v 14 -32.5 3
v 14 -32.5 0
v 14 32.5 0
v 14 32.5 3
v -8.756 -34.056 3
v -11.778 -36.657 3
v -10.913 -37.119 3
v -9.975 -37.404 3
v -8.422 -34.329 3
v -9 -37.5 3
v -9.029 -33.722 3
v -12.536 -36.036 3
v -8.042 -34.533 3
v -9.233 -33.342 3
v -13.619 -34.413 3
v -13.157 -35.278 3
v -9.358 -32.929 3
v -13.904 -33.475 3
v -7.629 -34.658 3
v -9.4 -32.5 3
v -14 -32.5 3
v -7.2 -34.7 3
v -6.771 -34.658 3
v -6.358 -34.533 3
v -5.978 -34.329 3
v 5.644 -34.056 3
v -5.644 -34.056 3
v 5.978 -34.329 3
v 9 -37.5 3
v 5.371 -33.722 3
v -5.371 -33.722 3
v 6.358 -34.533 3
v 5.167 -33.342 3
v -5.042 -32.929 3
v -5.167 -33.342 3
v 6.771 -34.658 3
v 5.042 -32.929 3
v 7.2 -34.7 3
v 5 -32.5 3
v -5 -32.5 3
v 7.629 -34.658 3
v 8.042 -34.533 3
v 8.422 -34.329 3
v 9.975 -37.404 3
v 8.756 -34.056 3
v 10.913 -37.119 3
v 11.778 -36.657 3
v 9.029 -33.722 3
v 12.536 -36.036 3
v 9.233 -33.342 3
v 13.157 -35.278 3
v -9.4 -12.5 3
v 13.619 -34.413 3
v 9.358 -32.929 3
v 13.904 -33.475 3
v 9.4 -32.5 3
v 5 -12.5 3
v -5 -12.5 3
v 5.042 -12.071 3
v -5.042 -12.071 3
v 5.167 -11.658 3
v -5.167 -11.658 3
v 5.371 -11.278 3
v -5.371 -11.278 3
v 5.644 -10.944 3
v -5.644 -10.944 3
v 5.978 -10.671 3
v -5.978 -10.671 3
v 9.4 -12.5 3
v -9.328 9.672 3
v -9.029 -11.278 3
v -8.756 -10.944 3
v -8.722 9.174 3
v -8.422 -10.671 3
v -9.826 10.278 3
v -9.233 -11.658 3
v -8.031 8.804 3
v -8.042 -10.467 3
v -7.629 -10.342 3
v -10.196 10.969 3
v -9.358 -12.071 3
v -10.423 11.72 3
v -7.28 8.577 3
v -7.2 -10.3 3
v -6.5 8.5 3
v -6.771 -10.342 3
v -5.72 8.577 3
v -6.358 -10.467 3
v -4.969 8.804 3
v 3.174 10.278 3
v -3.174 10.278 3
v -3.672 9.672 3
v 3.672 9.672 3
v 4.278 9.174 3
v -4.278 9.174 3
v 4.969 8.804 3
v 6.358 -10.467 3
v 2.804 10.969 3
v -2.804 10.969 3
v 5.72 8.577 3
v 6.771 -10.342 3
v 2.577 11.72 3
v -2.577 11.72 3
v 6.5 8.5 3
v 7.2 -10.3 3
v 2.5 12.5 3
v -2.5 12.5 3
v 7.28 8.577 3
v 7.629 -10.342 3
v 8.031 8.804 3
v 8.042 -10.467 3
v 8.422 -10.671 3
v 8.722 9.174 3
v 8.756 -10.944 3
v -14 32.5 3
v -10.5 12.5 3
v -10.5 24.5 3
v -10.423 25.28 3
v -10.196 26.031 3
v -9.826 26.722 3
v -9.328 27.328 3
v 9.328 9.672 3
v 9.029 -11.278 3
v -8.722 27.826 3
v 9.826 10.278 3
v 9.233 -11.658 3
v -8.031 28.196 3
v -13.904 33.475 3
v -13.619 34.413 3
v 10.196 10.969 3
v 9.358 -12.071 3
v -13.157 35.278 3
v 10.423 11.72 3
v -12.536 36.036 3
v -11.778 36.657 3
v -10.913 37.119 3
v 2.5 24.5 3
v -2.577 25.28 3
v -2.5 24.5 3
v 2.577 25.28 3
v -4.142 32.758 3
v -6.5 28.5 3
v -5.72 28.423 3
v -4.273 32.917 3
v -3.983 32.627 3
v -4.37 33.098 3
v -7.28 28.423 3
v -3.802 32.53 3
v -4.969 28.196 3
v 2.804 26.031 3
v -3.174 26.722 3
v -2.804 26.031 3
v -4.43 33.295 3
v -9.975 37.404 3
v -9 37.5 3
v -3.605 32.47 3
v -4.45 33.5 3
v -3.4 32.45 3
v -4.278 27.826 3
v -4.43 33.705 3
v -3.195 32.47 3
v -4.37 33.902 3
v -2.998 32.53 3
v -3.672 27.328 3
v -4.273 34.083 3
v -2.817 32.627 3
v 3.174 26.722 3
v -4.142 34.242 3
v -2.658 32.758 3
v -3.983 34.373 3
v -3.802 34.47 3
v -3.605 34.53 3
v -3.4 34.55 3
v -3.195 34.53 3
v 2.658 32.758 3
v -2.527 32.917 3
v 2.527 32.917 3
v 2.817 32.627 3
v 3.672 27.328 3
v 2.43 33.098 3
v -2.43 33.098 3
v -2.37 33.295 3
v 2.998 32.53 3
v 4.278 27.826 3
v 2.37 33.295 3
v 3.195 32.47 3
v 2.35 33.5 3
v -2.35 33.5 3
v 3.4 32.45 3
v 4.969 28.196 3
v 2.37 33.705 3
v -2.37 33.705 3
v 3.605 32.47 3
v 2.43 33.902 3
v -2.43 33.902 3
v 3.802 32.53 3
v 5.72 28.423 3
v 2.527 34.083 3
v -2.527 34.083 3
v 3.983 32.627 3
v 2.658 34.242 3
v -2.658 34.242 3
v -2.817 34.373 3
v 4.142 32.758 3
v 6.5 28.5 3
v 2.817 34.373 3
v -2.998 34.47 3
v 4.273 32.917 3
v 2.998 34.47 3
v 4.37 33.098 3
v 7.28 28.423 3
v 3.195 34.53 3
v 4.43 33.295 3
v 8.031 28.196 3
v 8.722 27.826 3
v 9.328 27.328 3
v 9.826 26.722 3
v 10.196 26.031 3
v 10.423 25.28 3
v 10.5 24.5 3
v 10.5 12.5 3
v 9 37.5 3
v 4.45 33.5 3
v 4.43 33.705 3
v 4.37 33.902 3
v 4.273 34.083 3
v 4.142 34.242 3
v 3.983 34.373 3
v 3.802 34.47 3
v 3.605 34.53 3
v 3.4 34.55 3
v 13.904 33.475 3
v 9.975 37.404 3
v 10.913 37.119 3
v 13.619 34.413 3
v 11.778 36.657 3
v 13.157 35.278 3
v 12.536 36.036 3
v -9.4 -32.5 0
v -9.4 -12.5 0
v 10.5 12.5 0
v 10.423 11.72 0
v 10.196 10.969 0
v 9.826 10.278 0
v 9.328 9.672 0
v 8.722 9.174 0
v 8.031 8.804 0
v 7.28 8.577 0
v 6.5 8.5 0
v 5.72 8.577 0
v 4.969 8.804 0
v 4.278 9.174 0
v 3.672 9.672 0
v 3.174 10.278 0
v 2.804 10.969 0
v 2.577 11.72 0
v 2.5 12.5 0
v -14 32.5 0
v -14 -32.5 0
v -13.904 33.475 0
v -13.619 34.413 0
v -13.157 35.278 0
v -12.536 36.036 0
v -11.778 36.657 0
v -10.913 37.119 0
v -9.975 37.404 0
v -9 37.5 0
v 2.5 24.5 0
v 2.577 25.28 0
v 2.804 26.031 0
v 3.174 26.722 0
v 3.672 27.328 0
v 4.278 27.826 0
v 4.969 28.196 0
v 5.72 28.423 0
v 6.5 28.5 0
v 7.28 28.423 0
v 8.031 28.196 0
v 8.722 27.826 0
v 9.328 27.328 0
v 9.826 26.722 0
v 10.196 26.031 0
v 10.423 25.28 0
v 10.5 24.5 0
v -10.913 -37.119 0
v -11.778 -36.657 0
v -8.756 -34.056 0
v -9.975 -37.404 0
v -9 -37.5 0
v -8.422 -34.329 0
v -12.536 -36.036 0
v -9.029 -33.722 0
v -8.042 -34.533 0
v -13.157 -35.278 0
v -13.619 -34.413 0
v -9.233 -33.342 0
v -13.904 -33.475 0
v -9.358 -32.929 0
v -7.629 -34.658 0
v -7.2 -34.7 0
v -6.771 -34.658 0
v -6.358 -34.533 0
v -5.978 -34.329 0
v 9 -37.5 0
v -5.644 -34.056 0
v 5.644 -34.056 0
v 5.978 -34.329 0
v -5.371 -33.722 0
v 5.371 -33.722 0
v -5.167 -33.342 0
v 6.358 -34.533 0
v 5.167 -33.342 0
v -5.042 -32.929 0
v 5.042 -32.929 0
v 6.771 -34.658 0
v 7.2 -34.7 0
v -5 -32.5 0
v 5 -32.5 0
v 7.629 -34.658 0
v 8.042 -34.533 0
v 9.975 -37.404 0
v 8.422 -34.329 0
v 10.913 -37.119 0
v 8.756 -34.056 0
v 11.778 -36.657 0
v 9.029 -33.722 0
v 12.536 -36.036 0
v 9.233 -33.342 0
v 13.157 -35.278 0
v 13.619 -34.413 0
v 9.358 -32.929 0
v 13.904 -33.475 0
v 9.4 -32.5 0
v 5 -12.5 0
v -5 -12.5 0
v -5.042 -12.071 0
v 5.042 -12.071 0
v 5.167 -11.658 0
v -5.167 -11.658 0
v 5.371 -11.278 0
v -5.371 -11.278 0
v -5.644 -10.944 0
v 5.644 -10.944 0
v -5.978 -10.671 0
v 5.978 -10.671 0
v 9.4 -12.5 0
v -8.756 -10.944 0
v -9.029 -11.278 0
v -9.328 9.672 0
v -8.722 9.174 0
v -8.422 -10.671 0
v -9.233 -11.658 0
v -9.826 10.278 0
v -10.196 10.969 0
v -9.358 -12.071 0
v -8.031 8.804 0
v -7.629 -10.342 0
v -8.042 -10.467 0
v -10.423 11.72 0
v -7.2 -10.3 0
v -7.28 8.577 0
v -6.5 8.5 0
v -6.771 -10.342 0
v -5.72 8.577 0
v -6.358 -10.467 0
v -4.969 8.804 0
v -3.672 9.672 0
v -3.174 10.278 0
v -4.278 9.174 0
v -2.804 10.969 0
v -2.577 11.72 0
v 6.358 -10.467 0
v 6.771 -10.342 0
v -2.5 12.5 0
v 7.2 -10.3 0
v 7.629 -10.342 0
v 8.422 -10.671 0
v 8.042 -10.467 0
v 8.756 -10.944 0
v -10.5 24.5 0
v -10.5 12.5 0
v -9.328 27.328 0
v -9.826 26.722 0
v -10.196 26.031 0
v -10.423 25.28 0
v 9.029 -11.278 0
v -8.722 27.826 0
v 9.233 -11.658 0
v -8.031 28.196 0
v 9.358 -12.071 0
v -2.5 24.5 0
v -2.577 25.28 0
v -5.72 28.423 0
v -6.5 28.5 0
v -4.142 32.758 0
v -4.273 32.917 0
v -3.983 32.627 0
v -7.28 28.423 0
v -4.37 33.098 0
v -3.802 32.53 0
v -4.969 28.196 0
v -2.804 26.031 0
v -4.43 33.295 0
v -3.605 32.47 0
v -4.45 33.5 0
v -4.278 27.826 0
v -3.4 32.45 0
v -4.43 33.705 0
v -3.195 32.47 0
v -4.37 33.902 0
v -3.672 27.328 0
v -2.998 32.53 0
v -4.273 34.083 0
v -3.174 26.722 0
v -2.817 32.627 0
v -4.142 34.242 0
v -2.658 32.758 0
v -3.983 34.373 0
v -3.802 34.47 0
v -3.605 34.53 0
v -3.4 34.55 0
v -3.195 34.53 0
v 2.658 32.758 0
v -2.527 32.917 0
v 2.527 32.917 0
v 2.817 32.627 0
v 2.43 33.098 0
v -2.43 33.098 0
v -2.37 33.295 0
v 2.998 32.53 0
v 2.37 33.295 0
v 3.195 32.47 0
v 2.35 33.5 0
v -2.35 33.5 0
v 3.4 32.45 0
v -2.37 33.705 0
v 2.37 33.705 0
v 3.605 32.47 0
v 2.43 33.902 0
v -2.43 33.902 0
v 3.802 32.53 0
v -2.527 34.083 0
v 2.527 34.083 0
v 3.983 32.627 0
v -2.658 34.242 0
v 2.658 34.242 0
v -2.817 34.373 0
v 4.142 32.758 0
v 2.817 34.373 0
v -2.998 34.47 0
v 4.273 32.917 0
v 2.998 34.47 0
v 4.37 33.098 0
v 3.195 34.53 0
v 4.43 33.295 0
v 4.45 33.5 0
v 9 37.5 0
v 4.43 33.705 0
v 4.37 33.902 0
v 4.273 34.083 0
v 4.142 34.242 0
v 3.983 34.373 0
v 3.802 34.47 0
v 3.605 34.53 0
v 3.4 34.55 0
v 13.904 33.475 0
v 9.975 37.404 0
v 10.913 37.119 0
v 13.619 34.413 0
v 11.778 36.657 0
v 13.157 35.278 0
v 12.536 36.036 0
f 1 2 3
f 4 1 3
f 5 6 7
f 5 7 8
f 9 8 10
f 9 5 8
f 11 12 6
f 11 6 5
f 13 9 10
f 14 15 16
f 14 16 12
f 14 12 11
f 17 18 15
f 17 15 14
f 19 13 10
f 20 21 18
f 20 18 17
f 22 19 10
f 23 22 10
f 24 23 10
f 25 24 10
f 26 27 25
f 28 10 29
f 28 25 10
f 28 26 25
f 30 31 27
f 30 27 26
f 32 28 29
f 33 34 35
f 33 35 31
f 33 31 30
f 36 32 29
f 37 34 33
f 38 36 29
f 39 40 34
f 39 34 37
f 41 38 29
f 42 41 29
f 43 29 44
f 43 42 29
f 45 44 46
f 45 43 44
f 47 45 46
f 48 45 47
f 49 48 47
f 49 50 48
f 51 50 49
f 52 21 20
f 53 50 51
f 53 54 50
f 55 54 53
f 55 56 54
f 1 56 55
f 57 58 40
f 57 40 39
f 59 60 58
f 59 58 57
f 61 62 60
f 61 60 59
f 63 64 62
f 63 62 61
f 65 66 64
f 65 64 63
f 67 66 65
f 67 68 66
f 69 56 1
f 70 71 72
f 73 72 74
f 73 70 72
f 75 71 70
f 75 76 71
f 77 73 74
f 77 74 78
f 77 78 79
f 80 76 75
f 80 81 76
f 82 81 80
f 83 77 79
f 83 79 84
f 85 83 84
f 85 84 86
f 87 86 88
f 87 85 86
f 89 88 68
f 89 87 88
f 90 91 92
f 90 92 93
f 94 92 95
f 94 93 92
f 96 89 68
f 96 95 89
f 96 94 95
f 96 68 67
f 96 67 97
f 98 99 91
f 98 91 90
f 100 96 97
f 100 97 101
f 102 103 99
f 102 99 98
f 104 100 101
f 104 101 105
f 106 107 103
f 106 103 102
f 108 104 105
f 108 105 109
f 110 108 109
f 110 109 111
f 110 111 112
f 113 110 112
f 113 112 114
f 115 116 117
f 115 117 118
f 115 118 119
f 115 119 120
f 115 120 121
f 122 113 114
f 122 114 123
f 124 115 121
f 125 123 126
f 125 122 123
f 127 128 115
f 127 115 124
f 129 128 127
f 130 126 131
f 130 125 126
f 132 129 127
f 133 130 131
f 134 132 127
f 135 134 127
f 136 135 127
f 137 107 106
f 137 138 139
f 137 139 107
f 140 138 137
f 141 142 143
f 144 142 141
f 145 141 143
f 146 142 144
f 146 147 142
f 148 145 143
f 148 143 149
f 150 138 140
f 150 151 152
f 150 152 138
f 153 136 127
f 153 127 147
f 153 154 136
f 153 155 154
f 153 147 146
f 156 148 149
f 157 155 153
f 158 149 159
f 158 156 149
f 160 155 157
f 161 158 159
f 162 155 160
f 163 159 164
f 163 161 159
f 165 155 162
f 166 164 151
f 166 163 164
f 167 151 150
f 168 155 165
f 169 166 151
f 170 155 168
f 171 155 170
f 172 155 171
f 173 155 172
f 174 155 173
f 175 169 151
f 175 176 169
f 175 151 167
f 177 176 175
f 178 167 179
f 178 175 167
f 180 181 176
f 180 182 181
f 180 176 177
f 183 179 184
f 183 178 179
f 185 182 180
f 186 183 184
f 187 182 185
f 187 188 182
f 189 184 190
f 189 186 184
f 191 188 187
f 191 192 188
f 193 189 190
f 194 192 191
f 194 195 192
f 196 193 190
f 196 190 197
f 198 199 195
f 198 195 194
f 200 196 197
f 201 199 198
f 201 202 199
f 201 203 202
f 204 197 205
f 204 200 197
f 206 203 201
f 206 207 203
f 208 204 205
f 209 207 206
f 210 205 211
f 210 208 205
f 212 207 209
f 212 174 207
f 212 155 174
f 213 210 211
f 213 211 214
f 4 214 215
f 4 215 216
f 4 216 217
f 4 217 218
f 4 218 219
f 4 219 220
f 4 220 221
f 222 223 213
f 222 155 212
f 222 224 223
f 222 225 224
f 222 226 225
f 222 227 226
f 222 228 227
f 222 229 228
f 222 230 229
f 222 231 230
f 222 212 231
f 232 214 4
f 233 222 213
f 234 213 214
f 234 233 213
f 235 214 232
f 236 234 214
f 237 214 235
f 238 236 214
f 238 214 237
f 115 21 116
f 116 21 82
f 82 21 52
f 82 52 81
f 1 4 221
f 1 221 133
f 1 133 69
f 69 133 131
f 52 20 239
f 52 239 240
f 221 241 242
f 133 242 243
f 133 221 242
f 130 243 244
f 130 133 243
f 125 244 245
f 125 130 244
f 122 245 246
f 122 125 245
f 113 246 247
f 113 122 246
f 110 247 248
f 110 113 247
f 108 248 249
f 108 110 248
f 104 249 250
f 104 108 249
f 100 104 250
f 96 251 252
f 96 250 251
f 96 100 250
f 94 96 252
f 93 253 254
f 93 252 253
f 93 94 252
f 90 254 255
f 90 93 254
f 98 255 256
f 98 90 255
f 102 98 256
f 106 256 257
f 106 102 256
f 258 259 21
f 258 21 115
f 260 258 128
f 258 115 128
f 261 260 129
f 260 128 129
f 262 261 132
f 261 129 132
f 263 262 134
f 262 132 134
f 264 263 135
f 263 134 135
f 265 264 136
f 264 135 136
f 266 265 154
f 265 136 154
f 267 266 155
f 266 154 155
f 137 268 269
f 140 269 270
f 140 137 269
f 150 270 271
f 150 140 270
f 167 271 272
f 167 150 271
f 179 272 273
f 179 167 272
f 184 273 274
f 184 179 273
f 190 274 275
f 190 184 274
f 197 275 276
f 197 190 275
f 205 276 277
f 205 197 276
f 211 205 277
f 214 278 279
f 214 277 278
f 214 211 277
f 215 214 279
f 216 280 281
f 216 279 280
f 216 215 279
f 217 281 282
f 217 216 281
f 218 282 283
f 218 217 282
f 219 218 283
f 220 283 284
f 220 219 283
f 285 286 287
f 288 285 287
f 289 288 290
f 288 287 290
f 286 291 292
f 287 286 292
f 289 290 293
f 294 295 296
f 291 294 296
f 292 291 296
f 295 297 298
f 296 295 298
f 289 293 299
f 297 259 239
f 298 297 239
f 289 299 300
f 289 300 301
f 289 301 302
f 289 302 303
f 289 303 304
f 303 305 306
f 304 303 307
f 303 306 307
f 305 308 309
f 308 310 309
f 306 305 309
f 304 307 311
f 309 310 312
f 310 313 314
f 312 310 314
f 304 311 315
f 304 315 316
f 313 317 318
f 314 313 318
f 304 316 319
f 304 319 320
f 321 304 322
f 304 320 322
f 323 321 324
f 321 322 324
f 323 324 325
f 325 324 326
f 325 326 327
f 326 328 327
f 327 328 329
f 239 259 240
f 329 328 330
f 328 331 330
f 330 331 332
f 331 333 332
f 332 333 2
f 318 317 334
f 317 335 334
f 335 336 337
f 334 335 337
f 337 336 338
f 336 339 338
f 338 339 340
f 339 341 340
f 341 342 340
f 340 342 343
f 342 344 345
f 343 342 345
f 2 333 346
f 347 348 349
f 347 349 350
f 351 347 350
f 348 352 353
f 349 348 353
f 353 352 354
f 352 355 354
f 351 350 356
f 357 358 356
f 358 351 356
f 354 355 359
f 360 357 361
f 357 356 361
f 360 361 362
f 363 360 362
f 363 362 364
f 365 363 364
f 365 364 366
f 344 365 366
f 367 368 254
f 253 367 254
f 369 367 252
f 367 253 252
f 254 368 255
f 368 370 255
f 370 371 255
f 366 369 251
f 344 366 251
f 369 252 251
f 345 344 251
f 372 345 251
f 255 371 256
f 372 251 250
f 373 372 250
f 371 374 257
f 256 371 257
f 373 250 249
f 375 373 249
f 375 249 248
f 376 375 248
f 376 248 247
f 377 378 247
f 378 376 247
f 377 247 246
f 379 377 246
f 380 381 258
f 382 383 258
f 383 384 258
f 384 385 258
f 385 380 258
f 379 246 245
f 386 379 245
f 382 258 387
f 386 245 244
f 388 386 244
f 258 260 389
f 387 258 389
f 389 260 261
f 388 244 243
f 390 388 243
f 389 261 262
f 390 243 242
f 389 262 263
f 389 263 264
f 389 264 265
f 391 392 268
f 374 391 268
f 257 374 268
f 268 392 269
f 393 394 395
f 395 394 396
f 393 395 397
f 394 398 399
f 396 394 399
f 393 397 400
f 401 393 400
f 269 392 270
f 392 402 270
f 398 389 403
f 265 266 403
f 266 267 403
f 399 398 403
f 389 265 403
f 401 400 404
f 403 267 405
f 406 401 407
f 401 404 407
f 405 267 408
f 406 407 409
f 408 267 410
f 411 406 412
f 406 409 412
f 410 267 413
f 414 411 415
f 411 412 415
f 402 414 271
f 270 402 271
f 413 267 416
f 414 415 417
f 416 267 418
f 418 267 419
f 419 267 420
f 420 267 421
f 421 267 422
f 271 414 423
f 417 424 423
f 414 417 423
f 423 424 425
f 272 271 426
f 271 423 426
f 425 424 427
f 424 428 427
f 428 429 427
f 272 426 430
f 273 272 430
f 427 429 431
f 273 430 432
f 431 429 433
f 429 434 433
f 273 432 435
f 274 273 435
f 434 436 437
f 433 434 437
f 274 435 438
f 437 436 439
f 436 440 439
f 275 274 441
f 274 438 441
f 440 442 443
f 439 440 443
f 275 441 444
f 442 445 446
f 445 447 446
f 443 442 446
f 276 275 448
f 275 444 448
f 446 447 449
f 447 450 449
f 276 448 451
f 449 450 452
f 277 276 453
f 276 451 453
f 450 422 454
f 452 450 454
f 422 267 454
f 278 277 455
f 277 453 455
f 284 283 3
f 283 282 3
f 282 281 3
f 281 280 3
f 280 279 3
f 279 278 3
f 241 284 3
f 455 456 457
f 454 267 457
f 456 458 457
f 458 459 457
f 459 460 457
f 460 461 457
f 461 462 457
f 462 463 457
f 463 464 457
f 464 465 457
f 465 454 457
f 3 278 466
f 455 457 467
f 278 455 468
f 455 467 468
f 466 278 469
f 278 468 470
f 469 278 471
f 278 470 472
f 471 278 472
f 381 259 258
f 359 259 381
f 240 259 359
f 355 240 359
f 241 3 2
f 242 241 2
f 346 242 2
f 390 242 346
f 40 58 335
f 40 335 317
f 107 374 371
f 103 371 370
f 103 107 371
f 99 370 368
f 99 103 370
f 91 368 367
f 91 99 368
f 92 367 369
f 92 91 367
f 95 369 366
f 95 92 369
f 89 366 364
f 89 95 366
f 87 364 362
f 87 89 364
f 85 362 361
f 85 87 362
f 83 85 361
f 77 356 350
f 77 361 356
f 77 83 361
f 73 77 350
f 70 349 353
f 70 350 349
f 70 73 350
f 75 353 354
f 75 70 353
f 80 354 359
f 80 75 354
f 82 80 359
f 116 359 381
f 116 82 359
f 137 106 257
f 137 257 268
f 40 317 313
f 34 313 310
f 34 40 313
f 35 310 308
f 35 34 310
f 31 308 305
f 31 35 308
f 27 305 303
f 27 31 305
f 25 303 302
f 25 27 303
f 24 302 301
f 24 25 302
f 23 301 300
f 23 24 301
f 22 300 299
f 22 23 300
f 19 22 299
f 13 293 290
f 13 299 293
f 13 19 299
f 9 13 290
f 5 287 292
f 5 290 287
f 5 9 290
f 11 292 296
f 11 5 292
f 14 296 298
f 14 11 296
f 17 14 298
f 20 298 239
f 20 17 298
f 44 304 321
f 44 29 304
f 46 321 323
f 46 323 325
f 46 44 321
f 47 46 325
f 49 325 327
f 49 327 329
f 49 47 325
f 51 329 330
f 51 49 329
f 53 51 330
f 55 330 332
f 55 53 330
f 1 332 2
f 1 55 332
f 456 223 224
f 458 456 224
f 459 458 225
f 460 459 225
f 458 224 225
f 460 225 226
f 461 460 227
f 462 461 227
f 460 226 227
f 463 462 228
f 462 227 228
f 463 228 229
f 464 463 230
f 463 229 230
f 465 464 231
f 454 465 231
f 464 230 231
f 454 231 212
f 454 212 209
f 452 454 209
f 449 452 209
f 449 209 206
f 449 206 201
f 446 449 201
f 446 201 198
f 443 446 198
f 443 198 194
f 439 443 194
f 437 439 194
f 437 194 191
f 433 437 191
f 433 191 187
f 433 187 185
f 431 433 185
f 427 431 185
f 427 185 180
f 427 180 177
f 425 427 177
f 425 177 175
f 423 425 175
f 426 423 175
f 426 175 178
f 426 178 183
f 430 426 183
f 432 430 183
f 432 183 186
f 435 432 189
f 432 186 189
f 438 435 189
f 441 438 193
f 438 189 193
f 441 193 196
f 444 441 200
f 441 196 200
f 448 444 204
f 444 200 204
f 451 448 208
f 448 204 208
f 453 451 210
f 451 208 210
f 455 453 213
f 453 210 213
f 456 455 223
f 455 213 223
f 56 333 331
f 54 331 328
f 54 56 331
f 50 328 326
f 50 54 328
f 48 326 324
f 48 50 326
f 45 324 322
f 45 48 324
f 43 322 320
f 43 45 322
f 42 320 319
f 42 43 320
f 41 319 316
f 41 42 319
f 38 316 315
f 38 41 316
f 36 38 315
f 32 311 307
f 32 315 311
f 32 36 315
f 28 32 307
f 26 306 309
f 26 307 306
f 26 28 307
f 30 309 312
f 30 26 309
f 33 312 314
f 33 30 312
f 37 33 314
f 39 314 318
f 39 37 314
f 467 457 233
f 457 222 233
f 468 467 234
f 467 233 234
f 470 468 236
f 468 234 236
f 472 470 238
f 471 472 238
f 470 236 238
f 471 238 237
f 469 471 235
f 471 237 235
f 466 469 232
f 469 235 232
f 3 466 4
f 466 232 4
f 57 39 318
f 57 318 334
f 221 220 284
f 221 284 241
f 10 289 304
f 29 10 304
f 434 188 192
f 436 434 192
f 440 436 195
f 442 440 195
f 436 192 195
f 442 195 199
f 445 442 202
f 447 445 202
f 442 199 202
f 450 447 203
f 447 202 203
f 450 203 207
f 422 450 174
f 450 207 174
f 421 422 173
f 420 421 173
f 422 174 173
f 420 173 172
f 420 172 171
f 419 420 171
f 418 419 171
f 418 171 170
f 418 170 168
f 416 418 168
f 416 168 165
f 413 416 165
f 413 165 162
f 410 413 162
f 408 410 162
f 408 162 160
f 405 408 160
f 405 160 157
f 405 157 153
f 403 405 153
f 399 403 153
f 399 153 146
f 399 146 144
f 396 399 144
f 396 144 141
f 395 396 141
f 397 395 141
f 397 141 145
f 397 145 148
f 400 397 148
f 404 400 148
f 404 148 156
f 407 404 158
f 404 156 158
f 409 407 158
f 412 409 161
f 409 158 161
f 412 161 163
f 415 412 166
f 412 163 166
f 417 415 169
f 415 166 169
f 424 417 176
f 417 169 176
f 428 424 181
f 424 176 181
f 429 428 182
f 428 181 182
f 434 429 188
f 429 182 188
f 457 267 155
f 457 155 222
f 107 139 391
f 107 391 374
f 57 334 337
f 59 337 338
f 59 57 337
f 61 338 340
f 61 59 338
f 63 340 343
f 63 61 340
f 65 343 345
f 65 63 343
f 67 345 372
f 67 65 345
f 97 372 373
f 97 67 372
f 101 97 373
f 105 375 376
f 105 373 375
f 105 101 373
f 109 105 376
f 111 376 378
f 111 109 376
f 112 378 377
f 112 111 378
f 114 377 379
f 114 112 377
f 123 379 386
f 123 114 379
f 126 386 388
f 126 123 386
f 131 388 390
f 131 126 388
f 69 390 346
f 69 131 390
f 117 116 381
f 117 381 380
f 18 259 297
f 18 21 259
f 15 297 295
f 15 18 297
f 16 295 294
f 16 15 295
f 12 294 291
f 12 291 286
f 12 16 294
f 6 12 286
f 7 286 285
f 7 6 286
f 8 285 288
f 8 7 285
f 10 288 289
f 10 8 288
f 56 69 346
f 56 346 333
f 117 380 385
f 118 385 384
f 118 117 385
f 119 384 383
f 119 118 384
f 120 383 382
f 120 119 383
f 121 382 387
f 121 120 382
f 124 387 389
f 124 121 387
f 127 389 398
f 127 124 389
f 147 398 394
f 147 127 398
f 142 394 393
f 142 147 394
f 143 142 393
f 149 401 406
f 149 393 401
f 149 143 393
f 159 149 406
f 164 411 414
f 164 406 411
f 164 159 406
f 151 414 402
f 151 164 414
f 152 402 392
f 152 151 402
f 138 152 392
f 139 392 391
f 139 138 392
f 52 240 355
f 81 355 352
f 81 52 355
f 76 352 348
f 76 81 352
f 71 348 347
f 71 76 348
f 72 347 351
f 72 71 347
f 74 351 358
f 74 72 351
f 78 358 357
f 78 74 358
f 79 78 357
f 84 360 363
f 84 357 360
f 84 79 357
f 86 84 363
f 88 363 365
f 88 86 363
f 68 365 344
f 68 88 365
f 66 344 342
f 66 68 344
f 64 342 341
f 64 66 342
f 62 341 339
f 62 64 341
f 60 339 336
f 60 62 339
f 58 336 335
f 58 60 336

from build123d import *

# Parameters (mm, degrees)
SKETCH1_W           = 28
SKETCH1_H           = 75
BOSS_EXTRUDE1_DEPTH = 3
SKETCH2_R           = 1.05
CUT_EXTRUDE1_DEPTH  = 41.140378673
FILLET1_R           = 5


with BuildPart() as part:
    # Sketch1 → Boss-Extrude1 (new body)
    with BuildSketch(Plane.XY):
        Rectangle(SKETCH1_W, SKETCH1_H)
    extrude(amount=BOSS_EXTRUDE1_DEPTH)

    # Sketch2 → Cut-Extrude1 (cut, through all)
    with BuildSketch(Plane.XY.offset(3)):
        with Locations((-3.4, 33.5)):
            Circle(SKETCH2_R)
        with Locations((3.4, 33.5)):
            Circle(SKETCH2_R)
        with BuildLine():
            Line((-10.499999957, 12.5), (-10.499999957, 24.5))
            ThreePointArc((-10.499999957, 24.5), (-6.5, 28.499999957), (-2.500000043, 24.5))
            Line((-2.500000043, 24.5), (-2.500000043, 12.5))
            ThreePointArc((-2.500000043, 12.5), (-6.5, 8.500000043), (-10.499999957, 12.5))
        make_face()
        with BuildLine():
            Line((2.500000043, 12.5), (2.500000043, 24.5))
            ThreePointArc((2.500000043, 24.5), (6.5, 28.499999957), (10.499999957, 24.5))
            Line((10.499999957, 24.5), (10.499999957, 12.5))
            ThreePointArc((10.499999957, 12.5), (6.5, 8.500000043), (2.500000043, 12.5))
        make_face()
        with BuildLine():
            Line((-9.4, -32.5), (-9.4, -12.5))
            ThreePointArc((-9.4, -12.5), (-7.2, -10.3), (-5, -12.5))
            Line((-5, -12.5), (-5, -32.5))
            ThreePointArc((-5, -32.5), (-7.2, -34.7), (-9.4, -32.5))
        make_face()
        with BuildLine():
            Line((5, -32.5), (5, -12.5))
            ThreePointArc((5, -12.5), (7.2, -10.3), (9.4, -12.5))
            Line((9.4, -12.5), (9.4, -32.5))
            ThreePointArc((9.4, -32.5), (7.2, -34.7), (5, -32.5))
        make_face()
    extrude(amount=-CUT_EXTRUDE1_DEPTH, mode=Mode.SUBTRACT)

    # Fillet1
    fillet1_edges = [part.edges().sort_by_distance(p)[0] for p in [
        (-14, 37.5, 1.5),
        (14, 37.5, 1.5),
        (14, -37.5, 1.5),
        (-14, -37.5, 1.5),
    ]]
    fillet(fillet1_edges, radius=FILLET1_R)


solid = part.part
